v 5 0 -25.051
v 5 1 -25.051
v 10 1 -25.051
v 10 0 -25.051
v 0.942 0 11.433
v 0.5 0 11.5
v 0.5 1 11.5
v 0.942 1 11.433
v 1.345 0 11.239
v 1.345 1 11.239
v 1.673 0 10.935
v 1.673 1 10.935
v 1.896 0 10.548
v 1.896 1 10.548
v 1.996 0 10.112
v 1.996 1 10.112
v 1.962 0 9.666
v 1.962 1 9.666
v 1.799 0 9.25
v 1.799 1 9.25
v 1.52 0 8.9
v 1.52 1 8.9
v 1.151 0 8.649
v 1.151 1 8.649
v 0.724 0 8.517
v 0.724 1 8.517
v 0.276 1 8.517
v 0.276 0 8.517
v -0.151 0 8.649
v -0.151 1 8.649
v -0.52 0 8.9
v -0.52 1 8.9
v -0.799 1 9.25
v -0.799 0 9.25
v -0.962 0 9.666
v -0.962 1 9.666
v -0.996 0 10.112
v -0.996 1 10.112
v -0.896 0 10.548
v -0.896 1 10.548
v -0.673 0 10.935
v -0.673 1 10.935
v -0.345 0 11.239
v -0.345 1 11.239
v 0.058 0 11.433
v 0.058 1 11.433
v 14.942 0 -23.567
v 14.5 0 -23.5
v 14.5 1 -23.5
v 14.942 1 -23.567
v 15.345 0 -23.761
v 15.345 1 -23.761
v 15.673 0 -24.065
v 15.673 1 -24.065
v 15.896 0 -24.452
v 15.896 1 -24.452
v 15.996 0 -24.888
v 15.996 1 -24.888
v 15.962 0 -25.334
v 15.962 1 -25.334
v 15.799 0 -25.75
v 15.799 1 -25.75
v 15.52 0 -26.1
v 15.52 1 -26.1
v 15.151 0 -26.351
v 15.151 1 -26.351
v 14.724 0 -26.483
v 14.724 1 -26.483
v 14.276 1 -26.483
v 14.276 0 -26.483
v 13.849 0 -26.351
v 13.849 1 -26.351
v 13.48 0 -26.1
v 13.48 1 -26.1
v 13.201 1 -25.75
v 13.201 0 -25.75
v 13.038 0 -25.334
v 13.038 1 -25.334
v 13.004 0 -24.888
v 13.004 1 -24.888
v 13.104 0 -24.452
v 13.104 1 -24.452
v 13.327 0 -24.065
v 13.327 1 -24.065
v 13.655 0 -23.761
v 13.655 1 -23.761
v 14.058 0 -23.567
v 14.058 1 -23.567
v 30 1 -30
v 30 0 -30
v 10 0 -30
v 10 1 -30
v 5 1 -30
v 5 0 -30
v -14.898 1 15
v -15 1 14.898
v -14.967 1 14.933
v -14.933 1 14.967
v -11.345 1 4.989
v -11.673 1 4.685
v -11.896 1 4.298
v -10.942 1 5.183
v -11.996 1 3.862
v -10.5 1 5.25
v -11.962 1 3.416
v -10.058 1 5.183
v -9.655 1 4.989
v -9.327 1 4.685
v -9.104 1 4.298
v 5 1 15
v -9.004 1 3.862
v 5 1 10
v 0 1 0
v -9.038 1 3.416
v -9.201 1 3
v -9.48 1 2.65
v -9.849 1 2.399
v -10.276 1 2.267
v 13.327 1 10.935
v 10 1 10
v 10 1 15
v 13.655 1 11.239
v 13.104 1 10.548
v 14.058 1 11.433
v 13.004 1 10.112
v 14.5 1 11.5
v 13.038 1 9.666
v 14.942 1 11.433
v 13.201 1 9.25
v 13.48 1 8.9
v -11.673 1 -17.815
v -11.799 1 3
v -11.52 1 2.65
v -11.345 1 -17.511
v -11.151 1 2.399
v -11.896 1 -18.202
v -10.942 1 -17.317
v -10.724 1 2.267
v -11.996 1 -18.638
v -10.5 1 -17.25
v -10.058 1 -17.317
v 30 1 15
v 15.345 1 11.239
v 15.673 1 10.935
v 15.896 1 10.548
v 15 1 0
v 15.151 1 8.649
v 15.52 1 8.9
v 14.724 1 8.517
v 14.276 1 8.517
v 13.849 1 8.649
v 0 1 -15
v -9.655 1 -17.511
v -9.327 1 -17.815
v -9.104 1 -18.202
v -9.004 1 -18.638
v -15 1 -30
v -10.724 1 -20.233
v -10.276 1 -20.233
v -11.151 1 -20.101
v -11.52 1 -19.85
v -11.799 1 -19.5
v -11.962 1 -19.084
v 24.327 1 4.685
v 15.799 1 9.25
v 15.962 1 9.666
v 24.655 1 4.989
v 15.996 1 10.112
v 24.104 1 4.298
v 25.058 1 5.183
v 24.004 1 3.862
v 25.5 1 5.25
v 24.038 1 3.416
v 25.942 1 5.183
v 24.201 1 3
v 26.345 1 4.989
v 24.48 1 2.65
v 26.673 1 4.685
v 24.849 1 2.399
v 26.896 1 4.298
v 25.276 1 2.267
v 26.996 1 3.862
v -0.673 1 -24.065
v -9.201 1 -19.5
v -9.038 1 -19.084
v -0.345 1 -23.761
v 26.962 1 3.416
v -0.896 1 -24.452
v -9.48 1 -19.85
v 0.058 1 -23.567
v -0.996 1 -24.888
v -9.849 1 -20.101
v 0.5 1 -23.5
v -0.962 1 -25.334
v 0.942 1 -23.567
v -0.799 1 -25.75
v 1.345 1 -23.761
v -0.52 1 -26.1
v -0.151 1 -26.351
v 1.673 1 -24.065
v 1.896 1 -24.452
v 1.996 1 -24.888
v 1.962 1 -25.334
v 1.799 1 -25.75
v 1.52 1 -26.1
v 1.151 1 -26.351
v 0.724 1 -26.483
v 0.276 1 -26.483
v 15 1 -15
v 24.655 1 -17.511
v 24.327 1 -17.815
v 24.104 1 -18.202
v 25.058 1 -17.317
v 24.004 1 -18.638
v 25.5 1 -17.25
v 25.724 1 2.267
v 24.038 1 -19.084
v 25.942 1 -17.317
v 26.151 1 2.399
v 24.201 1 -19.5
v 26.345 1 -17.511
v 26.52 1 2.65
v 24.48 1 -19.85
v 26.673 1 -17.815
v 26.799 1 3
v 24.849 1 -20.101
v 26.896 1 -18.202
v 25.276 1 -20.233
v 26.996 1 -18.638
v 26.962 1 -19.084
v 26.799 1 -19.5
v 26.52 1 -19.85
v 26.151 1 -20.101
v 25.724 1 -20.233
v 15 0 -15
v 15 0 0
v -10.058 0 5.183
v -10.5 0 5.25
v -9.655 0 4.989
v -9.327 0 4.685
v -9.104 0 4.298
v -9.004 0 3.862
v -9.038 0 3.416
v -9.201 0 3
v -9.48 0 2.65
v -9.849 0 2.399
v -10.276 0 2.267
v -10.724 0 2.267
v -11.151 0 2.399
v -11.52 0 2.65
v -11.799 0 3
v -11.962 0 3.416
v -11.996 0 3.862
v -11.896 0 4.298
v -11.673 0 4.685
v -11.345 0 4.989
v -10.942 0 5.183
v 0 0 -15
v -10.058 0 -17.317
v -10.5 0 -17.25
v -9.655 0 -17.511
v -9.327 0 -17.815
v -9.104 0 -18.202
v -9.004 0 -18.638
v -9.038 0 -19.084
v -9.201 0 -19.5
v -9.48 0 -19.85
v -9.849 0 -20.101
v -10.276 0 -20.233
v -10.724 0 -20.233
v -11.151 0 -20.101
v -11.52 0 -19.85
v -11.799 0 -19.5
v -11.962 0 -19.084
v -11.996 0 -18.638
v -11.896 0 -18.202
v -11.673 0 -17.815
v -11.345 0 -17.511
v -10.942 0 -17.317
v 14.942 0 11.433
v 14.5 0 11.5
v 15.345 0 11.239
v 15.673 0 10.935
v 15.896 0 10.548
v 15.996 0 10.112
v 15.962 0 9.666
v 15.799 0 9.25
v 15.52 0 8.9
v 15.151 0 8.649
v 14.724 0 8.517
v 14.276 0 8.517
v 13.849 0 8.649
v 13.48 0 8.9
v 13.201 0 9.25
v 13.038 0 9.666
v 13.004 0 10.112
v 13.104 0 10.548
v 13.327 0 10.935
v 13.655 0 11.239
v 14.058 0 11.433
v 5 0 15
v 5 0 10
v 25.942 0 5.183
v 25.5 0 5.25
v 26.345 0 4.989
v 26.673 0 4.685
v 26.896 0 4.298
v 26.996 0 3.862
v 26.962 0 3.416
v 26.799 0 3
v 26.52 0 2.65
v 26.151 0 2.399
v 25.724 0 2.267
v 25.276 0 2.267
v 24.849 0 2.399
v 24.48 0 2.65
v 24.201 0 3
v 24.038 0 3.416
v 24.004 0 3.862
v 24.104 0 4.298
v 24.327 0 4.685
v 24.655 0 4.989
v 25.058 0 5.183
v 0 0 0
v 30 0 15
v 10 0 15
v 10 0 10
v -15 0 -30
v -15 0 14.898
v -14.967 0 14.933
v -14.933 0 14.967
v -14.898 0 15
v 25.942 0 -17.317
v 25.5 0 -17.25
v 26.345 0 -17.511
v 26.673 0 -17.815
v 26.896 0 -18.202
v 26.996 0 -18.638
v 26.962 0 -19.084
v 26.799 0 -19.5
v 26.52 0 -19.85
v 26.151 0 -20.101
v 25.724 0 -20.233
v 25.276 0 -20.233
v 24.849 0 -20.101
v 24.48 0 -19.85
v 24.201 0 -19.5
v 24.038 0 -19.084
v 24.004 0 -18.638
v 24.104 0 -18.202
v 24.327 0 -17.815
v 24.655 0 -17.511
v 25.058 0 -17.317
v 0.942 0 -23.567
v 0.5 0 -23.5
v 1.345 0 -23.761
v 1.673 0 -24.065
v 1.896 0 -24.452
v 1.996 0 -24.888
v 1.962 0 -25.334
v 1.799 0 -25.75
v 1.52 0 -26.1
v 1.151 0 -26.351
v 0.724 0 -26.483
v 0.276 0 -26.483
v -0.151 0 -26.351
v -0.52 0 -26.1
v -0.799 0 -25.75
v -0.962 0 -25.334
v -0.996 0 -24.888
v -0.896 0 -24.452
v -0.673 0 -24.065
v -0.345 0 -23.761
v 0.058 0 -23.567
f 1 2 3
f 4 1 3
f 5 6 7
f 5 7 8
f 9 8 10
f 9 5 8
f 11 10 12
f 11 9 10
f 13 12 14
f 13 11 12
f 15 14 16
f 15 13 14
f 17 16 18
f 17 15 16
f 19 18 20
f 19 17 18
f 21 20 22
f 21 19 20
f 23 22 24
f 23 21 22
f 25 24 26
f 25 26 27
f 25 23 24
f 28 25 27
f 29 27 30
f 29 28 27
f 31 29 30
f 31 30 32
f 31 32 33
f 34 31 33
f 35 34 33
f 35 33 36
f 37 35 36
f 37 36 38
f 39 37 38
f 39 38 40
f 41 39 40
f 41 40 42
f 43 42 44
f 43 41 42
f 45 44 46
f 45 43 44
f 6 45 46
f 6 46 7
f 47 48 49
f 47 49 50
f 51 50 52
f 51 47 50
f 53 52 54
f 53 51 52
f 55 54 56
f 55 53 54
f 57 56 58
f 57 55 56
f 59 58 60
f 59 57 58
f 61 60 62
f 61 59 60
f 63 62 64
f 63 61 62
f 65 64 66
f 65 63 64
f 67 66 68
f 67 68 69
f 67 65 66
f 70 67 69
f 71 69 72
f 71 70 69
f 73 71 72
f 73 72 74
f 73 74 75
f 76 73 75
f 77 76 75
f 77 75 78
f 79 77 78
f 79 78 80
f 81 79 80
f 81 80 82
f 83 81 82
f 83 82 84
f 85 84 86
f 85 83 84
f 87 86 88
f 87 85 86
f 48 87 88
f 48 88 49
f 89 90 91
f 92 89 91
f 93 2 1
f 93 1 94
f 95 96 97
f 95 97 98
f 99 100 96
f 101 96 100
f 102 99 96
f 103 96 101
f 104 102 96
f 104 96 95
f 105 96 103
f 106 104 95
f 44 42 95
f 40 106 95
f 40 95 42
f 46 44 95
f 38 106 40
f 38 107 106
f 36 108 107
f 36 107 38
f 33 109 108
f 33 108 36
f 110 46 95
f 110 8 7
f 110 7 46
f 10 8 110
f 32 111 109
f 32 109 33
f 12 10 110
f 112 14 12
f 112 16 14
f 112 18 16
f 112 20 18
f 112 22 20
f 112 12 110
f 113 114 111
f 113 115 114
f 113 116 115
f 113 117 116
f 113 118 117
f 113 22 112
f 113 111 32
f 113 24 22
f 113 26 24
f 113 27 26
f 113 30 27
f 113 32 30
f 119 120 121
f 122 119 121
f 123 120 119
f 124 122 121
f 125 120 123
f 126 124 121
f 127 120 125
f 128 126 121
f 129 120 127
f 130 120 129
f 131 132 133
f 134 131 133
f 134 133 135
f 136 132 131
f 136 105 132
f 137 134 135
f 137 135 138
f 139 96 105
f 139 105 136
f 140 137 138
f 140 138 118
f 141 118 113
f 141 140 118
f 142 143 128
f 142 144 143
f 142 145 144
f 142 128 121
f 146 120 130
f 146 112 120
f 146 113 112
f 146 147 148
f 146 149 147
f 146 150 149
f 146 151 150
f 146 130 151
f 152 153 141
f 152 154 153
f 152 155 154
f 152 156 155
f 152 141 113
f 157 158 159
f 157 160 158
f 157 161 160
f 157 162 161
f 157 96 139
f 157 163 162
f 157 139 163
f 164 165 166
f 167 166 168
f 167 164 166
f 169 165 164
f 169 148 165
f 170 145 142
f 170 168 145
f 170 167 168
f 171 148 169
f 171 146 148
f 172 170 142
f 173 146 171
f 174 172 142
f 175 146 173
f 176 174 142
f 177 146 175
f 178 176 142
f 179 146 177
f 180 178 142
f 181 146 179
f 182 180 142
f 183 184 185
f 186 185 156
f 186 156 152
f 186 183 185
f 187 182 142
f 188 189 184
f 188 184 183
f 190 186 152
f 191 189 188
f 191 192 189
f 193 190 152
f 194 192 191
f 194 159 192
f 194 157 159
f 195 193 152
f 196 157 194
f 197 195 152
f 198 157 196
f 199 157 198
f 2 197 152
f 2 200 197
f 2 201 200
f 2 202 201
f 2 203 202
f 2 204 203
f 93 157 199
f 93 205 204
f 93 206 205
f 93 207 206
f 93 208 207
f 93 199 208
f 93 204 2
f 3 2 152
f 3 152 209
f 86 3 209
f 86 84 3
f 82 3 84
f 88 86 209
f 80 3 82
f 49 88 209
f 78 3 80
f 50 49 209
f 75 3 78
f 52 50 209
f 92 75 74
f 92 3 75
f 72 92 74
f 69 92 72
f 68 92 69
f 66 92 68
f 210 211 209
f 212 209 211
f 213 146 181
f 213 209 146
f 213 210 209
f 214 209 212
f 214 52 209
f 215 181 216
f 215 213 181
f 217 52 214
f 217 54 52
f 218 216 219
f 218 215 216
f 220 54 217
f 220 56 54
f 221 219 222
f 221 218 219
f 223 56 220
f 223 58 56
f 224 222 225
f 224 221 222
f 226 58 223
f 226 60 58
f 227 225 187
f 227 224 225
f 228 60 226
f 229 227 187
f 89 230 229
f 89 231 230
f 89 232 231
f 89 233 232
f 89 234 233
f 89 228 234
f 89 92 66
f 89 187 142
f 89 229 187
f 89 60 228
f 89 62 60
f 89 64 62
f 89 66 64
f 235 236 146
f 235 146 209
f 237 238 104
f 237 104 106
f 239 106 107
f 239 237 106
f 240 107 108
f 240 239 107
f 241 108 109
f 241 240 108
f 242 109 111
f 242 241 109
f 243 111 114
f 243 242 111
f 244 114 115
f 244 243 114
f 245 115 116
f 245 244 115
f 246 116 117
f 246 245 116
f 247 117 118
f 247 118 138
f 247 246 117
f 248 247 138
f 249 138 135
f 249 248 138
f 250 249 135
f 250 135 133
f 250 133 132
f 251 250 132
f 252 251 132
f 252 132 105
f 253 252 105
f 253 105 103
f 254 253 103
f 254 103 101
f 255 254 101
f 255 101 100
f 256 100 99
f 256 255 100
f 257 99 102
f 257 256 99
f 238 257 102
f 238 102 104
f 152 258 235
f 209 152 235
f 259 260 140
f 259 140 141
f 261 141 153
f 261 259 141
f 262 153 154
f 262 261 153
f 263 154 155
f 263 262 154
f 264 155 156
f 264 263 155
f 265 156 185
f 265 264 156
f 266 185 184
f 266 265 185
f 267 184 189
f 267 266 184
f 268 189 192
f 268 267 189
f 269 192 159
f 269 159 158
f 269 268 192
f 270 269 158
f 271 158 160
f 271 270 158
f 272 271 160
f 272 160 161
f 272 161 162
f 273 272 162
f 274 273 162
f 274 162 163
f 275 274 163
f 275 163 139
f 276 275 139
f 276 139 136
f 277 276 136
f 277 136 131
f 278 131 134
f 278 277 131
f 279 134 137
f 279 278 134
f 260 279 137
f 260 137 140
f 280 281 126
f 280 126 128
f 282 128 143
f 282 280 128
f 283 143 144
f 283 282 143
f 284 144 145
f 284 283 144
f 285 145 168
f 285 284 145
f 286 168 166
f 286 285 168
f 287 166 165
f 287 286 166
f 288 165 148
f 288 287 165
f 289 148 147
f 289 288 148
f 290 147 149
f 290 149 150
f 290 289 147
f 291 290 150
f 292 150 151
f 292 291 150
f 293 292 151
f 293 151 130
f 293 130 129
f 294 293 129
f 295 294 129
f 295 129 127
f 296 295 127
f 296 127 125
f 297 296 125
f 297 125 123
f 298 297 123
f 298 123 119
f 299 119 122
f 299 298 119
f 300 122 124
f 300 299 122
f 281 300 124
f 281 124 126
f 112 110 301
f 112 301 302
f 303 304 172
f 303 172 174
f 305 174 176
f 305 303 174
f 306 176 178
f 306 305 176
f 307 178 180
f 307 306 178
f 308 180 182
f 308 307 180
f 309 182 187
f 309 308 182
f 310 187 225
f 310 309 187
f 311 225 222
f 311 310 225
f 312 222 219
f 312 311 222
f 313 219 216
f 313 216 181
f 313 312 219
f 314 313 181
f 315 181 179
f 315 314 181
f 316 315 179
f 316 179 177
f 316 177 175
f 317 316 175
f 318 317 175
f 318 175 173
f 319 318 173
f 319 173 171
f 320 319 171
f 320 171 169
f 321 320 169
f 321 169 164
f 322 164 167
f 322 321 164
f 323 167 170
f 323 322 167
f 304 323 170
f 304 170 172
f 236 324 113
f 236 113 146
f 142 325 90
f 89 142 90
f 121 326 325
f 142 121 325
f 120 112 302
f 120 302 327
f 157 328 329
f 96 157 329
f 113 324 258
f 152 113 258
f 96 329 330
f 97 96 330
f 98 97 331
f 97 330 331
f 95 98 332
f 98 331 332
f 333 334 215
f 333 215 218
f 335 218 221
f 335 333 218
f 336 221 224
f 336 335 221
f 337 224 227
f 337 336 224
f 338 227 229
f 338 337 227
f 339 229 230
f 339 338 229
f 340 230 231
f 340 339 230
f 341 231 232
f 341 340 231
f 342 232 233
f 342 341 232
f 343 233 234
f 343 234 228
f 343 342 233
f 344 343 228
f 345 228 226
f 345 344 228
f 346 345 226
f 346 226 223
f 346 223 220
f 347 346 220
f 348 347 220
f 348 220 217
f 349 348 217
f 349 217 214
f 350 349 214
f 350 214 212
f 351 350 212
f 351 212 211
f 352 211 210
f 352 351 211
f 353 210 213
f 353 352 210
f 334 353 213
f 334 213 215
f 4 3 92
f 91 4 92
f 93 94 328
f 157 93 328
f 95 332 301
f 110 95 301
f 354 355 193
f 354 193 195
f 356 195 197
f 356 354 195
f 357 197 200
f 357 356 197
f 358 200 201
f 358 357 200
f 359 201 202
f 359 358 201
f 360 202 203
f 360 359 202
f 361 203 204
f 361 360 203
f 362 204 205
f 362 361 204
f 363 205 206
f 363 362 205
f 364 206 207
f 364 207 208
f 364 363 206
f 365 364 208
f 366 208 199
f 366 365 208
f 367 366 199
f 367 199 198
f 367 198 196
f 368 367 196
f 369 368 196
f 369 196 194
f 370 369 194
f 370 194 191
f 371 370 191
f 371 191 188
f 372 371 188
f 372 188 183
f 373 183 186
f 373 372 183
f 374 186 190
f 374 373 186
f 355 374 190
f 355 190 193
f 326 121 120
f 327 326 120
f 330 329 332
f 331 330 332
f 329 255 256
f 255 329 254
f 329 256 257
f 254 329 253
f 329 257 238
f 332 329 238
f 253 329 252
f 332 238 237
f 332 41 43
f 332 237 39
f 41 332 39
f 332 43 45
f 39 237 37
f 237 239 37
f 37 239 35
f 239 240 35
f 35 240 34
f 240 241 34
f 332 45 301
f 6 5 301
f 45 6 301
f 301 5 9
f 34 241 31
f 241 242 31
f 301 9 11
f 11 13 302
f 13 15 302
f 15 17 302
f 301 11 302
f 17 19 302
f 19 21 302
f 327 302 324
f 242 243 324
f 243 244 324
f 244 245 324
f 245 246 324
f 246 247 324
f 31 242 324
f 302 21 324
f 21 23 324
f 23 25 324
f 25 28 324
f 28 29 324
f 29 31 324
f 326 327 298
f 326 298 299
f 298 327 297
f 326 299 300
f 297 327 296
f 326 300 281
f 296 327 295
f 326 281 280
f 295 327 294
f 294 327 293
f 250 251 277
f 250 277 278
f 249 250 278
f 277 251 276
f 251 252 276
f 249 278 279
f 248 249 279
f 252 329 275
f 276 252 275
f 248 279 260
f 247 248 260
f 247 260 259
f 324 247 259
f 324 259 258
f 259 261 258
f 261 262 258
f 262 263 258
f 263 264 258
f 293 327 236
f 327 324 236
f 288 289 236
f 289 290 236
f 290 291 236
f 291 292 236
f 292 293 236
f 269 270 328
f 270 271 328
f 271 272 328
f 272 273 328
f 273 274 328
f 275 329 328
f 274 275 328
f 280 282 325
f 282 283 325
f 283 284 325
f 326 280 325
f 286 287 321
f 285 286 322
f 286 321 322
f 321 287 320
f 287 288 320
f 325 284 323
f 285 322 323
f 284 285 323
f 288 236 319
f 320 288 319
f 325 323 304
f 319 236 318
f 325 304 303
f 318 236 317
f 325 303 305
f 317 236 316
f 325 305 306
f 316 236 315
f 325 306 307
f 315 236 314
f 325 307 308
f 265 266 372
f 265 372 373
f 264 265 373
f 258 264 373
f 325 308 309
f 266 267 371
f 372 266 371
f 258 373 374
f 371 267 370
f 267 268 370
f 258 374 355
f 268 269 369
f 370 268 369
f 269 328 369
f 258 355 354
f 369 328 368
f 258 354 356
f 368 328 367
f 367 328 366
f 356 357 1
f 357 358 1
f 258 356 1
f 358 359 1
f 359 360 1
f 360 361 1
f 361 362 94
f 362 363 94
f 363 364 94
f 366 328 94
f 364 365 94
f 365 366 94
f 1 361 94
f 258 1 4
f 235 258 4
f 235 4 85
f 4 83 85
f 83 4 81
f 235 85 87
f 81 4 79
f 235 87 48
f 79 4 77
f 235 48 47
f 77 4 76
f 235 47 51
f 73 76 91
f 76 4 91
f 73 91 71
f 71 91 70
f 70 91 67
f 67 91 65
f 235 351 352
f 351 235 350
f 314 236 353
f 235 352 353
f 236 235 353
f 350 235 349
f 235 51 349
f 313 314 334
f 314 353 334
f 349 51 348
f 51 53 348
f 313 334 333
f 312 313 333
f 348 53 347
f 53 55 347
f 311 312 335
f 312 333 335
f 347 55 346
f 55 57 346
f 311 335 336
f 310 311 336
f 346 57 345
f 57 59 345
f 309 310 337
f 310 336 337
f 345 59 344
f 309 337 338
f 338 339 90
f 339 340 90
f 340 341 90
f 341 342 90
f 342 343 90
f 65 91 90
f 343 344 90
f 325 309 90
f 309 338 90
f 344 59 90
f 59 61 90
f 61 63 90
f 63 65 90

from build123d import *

# Parameters (mm, degrees)
CROQUIS1_R              = 1.5
CROQUIS1_W              = 15
CROQUIS1_H              = 15
SALIENTE_EXTRUIR1_DEPTH = 1
CROQUIS3_W              = 5
CROQUIS3_H              = 4.949226591
CROQUIS3_H_2            = 5
CORTAR_EXTRUIR2_DEPTH   = 10


with BuildPart() as part:
    # Croquis1 → Saliente-Extruir1 (new body)
    with BuildSketch(Plane(origin=(0, 0, 0), x_dir=(1, 0, 0), z_dir=(0, 1, 0))):
        with BuildLine():
            ThreePointArc((-15, -14.898453182), (-14.949747468, -14.949747468), (-14.898453182, -15))
            Line((-14.898453182, -15), (30, -15))
            Line((30, -15), (30, 30))
            Line((30, 30), (-15, 30))
            Line((-15, 30), (-15, -14.898453182))
        make_face()
        with Locations(Location((0.5, -10, 0), (0, 0, 270))):
            Circle(CROQUIS1_R, mode=Mode.SUBTRACT)
        with Locations(Location((-10.5, -3.75, 0), (0, 0, 270))):
            Circle(CROQUIS1_R, mode=Mode.SUBTRACT)
        with Locations(Location((14.5, -10, 0), (0, 0, 270))):
            Circle(CROQUIS1_R, mode=Mode.SUBTRACT)
        with Locations(Location((25.5, -3.75, 0), (0, 0, 270))):
            Circle(CROQUIS1_R, mode=Mode.SUBTRACT)
        with Locations(Location((-10.5, 18.75, 0), (0, 0, 270))):
            Circle(CROQUIS1_R, mode=Mode.SUBTRACT)
        with Locations(Location((0.5, 25, 0), (0, 0, 270))):
            Circle(CROQUIS1_R, mode=Mode.SUBTRACT)
        with Locations((7.5, 7.5)):
            Rectangle(CROQUIS1_W, CROQUIS1_H, mode=Mode.SUBTRACT)
        with Locations(Location((14.5, 25, 0), (0, 0, 270))):
            Circle(CROQUIS1_R, mode=Mode.SUBTRACT)
        with Locations(Location((25.5, 18.75, 0), (0, 0, 270))):
            Circle(CROQUIS1_R, mode=Mode.SUBTRACT)
    extrude(amount=SALIENTE_EXTRUIR1_DEPTH)

    # Croquis3 → Cortar-Extruir2 (cut)
    with BuildSketch(Plane(origin=(0, 1, 0), x_dir=(1, 0, 0), z_dir=(0, 1, 0))):
        with Locations((7.5, 27.525386705)):
            Rectangle(CROQUIS3_W, CROQUIS3_H)
        with Locations((7.5, -12.5)):
            Rectangle(CROQUIS3_W, CROQUIS3_H_2)
    extrude(amount=-CORTAR_EXTRUIR2_DEPTH, mode=Mode.SUBTRACT)


solid = part.part
